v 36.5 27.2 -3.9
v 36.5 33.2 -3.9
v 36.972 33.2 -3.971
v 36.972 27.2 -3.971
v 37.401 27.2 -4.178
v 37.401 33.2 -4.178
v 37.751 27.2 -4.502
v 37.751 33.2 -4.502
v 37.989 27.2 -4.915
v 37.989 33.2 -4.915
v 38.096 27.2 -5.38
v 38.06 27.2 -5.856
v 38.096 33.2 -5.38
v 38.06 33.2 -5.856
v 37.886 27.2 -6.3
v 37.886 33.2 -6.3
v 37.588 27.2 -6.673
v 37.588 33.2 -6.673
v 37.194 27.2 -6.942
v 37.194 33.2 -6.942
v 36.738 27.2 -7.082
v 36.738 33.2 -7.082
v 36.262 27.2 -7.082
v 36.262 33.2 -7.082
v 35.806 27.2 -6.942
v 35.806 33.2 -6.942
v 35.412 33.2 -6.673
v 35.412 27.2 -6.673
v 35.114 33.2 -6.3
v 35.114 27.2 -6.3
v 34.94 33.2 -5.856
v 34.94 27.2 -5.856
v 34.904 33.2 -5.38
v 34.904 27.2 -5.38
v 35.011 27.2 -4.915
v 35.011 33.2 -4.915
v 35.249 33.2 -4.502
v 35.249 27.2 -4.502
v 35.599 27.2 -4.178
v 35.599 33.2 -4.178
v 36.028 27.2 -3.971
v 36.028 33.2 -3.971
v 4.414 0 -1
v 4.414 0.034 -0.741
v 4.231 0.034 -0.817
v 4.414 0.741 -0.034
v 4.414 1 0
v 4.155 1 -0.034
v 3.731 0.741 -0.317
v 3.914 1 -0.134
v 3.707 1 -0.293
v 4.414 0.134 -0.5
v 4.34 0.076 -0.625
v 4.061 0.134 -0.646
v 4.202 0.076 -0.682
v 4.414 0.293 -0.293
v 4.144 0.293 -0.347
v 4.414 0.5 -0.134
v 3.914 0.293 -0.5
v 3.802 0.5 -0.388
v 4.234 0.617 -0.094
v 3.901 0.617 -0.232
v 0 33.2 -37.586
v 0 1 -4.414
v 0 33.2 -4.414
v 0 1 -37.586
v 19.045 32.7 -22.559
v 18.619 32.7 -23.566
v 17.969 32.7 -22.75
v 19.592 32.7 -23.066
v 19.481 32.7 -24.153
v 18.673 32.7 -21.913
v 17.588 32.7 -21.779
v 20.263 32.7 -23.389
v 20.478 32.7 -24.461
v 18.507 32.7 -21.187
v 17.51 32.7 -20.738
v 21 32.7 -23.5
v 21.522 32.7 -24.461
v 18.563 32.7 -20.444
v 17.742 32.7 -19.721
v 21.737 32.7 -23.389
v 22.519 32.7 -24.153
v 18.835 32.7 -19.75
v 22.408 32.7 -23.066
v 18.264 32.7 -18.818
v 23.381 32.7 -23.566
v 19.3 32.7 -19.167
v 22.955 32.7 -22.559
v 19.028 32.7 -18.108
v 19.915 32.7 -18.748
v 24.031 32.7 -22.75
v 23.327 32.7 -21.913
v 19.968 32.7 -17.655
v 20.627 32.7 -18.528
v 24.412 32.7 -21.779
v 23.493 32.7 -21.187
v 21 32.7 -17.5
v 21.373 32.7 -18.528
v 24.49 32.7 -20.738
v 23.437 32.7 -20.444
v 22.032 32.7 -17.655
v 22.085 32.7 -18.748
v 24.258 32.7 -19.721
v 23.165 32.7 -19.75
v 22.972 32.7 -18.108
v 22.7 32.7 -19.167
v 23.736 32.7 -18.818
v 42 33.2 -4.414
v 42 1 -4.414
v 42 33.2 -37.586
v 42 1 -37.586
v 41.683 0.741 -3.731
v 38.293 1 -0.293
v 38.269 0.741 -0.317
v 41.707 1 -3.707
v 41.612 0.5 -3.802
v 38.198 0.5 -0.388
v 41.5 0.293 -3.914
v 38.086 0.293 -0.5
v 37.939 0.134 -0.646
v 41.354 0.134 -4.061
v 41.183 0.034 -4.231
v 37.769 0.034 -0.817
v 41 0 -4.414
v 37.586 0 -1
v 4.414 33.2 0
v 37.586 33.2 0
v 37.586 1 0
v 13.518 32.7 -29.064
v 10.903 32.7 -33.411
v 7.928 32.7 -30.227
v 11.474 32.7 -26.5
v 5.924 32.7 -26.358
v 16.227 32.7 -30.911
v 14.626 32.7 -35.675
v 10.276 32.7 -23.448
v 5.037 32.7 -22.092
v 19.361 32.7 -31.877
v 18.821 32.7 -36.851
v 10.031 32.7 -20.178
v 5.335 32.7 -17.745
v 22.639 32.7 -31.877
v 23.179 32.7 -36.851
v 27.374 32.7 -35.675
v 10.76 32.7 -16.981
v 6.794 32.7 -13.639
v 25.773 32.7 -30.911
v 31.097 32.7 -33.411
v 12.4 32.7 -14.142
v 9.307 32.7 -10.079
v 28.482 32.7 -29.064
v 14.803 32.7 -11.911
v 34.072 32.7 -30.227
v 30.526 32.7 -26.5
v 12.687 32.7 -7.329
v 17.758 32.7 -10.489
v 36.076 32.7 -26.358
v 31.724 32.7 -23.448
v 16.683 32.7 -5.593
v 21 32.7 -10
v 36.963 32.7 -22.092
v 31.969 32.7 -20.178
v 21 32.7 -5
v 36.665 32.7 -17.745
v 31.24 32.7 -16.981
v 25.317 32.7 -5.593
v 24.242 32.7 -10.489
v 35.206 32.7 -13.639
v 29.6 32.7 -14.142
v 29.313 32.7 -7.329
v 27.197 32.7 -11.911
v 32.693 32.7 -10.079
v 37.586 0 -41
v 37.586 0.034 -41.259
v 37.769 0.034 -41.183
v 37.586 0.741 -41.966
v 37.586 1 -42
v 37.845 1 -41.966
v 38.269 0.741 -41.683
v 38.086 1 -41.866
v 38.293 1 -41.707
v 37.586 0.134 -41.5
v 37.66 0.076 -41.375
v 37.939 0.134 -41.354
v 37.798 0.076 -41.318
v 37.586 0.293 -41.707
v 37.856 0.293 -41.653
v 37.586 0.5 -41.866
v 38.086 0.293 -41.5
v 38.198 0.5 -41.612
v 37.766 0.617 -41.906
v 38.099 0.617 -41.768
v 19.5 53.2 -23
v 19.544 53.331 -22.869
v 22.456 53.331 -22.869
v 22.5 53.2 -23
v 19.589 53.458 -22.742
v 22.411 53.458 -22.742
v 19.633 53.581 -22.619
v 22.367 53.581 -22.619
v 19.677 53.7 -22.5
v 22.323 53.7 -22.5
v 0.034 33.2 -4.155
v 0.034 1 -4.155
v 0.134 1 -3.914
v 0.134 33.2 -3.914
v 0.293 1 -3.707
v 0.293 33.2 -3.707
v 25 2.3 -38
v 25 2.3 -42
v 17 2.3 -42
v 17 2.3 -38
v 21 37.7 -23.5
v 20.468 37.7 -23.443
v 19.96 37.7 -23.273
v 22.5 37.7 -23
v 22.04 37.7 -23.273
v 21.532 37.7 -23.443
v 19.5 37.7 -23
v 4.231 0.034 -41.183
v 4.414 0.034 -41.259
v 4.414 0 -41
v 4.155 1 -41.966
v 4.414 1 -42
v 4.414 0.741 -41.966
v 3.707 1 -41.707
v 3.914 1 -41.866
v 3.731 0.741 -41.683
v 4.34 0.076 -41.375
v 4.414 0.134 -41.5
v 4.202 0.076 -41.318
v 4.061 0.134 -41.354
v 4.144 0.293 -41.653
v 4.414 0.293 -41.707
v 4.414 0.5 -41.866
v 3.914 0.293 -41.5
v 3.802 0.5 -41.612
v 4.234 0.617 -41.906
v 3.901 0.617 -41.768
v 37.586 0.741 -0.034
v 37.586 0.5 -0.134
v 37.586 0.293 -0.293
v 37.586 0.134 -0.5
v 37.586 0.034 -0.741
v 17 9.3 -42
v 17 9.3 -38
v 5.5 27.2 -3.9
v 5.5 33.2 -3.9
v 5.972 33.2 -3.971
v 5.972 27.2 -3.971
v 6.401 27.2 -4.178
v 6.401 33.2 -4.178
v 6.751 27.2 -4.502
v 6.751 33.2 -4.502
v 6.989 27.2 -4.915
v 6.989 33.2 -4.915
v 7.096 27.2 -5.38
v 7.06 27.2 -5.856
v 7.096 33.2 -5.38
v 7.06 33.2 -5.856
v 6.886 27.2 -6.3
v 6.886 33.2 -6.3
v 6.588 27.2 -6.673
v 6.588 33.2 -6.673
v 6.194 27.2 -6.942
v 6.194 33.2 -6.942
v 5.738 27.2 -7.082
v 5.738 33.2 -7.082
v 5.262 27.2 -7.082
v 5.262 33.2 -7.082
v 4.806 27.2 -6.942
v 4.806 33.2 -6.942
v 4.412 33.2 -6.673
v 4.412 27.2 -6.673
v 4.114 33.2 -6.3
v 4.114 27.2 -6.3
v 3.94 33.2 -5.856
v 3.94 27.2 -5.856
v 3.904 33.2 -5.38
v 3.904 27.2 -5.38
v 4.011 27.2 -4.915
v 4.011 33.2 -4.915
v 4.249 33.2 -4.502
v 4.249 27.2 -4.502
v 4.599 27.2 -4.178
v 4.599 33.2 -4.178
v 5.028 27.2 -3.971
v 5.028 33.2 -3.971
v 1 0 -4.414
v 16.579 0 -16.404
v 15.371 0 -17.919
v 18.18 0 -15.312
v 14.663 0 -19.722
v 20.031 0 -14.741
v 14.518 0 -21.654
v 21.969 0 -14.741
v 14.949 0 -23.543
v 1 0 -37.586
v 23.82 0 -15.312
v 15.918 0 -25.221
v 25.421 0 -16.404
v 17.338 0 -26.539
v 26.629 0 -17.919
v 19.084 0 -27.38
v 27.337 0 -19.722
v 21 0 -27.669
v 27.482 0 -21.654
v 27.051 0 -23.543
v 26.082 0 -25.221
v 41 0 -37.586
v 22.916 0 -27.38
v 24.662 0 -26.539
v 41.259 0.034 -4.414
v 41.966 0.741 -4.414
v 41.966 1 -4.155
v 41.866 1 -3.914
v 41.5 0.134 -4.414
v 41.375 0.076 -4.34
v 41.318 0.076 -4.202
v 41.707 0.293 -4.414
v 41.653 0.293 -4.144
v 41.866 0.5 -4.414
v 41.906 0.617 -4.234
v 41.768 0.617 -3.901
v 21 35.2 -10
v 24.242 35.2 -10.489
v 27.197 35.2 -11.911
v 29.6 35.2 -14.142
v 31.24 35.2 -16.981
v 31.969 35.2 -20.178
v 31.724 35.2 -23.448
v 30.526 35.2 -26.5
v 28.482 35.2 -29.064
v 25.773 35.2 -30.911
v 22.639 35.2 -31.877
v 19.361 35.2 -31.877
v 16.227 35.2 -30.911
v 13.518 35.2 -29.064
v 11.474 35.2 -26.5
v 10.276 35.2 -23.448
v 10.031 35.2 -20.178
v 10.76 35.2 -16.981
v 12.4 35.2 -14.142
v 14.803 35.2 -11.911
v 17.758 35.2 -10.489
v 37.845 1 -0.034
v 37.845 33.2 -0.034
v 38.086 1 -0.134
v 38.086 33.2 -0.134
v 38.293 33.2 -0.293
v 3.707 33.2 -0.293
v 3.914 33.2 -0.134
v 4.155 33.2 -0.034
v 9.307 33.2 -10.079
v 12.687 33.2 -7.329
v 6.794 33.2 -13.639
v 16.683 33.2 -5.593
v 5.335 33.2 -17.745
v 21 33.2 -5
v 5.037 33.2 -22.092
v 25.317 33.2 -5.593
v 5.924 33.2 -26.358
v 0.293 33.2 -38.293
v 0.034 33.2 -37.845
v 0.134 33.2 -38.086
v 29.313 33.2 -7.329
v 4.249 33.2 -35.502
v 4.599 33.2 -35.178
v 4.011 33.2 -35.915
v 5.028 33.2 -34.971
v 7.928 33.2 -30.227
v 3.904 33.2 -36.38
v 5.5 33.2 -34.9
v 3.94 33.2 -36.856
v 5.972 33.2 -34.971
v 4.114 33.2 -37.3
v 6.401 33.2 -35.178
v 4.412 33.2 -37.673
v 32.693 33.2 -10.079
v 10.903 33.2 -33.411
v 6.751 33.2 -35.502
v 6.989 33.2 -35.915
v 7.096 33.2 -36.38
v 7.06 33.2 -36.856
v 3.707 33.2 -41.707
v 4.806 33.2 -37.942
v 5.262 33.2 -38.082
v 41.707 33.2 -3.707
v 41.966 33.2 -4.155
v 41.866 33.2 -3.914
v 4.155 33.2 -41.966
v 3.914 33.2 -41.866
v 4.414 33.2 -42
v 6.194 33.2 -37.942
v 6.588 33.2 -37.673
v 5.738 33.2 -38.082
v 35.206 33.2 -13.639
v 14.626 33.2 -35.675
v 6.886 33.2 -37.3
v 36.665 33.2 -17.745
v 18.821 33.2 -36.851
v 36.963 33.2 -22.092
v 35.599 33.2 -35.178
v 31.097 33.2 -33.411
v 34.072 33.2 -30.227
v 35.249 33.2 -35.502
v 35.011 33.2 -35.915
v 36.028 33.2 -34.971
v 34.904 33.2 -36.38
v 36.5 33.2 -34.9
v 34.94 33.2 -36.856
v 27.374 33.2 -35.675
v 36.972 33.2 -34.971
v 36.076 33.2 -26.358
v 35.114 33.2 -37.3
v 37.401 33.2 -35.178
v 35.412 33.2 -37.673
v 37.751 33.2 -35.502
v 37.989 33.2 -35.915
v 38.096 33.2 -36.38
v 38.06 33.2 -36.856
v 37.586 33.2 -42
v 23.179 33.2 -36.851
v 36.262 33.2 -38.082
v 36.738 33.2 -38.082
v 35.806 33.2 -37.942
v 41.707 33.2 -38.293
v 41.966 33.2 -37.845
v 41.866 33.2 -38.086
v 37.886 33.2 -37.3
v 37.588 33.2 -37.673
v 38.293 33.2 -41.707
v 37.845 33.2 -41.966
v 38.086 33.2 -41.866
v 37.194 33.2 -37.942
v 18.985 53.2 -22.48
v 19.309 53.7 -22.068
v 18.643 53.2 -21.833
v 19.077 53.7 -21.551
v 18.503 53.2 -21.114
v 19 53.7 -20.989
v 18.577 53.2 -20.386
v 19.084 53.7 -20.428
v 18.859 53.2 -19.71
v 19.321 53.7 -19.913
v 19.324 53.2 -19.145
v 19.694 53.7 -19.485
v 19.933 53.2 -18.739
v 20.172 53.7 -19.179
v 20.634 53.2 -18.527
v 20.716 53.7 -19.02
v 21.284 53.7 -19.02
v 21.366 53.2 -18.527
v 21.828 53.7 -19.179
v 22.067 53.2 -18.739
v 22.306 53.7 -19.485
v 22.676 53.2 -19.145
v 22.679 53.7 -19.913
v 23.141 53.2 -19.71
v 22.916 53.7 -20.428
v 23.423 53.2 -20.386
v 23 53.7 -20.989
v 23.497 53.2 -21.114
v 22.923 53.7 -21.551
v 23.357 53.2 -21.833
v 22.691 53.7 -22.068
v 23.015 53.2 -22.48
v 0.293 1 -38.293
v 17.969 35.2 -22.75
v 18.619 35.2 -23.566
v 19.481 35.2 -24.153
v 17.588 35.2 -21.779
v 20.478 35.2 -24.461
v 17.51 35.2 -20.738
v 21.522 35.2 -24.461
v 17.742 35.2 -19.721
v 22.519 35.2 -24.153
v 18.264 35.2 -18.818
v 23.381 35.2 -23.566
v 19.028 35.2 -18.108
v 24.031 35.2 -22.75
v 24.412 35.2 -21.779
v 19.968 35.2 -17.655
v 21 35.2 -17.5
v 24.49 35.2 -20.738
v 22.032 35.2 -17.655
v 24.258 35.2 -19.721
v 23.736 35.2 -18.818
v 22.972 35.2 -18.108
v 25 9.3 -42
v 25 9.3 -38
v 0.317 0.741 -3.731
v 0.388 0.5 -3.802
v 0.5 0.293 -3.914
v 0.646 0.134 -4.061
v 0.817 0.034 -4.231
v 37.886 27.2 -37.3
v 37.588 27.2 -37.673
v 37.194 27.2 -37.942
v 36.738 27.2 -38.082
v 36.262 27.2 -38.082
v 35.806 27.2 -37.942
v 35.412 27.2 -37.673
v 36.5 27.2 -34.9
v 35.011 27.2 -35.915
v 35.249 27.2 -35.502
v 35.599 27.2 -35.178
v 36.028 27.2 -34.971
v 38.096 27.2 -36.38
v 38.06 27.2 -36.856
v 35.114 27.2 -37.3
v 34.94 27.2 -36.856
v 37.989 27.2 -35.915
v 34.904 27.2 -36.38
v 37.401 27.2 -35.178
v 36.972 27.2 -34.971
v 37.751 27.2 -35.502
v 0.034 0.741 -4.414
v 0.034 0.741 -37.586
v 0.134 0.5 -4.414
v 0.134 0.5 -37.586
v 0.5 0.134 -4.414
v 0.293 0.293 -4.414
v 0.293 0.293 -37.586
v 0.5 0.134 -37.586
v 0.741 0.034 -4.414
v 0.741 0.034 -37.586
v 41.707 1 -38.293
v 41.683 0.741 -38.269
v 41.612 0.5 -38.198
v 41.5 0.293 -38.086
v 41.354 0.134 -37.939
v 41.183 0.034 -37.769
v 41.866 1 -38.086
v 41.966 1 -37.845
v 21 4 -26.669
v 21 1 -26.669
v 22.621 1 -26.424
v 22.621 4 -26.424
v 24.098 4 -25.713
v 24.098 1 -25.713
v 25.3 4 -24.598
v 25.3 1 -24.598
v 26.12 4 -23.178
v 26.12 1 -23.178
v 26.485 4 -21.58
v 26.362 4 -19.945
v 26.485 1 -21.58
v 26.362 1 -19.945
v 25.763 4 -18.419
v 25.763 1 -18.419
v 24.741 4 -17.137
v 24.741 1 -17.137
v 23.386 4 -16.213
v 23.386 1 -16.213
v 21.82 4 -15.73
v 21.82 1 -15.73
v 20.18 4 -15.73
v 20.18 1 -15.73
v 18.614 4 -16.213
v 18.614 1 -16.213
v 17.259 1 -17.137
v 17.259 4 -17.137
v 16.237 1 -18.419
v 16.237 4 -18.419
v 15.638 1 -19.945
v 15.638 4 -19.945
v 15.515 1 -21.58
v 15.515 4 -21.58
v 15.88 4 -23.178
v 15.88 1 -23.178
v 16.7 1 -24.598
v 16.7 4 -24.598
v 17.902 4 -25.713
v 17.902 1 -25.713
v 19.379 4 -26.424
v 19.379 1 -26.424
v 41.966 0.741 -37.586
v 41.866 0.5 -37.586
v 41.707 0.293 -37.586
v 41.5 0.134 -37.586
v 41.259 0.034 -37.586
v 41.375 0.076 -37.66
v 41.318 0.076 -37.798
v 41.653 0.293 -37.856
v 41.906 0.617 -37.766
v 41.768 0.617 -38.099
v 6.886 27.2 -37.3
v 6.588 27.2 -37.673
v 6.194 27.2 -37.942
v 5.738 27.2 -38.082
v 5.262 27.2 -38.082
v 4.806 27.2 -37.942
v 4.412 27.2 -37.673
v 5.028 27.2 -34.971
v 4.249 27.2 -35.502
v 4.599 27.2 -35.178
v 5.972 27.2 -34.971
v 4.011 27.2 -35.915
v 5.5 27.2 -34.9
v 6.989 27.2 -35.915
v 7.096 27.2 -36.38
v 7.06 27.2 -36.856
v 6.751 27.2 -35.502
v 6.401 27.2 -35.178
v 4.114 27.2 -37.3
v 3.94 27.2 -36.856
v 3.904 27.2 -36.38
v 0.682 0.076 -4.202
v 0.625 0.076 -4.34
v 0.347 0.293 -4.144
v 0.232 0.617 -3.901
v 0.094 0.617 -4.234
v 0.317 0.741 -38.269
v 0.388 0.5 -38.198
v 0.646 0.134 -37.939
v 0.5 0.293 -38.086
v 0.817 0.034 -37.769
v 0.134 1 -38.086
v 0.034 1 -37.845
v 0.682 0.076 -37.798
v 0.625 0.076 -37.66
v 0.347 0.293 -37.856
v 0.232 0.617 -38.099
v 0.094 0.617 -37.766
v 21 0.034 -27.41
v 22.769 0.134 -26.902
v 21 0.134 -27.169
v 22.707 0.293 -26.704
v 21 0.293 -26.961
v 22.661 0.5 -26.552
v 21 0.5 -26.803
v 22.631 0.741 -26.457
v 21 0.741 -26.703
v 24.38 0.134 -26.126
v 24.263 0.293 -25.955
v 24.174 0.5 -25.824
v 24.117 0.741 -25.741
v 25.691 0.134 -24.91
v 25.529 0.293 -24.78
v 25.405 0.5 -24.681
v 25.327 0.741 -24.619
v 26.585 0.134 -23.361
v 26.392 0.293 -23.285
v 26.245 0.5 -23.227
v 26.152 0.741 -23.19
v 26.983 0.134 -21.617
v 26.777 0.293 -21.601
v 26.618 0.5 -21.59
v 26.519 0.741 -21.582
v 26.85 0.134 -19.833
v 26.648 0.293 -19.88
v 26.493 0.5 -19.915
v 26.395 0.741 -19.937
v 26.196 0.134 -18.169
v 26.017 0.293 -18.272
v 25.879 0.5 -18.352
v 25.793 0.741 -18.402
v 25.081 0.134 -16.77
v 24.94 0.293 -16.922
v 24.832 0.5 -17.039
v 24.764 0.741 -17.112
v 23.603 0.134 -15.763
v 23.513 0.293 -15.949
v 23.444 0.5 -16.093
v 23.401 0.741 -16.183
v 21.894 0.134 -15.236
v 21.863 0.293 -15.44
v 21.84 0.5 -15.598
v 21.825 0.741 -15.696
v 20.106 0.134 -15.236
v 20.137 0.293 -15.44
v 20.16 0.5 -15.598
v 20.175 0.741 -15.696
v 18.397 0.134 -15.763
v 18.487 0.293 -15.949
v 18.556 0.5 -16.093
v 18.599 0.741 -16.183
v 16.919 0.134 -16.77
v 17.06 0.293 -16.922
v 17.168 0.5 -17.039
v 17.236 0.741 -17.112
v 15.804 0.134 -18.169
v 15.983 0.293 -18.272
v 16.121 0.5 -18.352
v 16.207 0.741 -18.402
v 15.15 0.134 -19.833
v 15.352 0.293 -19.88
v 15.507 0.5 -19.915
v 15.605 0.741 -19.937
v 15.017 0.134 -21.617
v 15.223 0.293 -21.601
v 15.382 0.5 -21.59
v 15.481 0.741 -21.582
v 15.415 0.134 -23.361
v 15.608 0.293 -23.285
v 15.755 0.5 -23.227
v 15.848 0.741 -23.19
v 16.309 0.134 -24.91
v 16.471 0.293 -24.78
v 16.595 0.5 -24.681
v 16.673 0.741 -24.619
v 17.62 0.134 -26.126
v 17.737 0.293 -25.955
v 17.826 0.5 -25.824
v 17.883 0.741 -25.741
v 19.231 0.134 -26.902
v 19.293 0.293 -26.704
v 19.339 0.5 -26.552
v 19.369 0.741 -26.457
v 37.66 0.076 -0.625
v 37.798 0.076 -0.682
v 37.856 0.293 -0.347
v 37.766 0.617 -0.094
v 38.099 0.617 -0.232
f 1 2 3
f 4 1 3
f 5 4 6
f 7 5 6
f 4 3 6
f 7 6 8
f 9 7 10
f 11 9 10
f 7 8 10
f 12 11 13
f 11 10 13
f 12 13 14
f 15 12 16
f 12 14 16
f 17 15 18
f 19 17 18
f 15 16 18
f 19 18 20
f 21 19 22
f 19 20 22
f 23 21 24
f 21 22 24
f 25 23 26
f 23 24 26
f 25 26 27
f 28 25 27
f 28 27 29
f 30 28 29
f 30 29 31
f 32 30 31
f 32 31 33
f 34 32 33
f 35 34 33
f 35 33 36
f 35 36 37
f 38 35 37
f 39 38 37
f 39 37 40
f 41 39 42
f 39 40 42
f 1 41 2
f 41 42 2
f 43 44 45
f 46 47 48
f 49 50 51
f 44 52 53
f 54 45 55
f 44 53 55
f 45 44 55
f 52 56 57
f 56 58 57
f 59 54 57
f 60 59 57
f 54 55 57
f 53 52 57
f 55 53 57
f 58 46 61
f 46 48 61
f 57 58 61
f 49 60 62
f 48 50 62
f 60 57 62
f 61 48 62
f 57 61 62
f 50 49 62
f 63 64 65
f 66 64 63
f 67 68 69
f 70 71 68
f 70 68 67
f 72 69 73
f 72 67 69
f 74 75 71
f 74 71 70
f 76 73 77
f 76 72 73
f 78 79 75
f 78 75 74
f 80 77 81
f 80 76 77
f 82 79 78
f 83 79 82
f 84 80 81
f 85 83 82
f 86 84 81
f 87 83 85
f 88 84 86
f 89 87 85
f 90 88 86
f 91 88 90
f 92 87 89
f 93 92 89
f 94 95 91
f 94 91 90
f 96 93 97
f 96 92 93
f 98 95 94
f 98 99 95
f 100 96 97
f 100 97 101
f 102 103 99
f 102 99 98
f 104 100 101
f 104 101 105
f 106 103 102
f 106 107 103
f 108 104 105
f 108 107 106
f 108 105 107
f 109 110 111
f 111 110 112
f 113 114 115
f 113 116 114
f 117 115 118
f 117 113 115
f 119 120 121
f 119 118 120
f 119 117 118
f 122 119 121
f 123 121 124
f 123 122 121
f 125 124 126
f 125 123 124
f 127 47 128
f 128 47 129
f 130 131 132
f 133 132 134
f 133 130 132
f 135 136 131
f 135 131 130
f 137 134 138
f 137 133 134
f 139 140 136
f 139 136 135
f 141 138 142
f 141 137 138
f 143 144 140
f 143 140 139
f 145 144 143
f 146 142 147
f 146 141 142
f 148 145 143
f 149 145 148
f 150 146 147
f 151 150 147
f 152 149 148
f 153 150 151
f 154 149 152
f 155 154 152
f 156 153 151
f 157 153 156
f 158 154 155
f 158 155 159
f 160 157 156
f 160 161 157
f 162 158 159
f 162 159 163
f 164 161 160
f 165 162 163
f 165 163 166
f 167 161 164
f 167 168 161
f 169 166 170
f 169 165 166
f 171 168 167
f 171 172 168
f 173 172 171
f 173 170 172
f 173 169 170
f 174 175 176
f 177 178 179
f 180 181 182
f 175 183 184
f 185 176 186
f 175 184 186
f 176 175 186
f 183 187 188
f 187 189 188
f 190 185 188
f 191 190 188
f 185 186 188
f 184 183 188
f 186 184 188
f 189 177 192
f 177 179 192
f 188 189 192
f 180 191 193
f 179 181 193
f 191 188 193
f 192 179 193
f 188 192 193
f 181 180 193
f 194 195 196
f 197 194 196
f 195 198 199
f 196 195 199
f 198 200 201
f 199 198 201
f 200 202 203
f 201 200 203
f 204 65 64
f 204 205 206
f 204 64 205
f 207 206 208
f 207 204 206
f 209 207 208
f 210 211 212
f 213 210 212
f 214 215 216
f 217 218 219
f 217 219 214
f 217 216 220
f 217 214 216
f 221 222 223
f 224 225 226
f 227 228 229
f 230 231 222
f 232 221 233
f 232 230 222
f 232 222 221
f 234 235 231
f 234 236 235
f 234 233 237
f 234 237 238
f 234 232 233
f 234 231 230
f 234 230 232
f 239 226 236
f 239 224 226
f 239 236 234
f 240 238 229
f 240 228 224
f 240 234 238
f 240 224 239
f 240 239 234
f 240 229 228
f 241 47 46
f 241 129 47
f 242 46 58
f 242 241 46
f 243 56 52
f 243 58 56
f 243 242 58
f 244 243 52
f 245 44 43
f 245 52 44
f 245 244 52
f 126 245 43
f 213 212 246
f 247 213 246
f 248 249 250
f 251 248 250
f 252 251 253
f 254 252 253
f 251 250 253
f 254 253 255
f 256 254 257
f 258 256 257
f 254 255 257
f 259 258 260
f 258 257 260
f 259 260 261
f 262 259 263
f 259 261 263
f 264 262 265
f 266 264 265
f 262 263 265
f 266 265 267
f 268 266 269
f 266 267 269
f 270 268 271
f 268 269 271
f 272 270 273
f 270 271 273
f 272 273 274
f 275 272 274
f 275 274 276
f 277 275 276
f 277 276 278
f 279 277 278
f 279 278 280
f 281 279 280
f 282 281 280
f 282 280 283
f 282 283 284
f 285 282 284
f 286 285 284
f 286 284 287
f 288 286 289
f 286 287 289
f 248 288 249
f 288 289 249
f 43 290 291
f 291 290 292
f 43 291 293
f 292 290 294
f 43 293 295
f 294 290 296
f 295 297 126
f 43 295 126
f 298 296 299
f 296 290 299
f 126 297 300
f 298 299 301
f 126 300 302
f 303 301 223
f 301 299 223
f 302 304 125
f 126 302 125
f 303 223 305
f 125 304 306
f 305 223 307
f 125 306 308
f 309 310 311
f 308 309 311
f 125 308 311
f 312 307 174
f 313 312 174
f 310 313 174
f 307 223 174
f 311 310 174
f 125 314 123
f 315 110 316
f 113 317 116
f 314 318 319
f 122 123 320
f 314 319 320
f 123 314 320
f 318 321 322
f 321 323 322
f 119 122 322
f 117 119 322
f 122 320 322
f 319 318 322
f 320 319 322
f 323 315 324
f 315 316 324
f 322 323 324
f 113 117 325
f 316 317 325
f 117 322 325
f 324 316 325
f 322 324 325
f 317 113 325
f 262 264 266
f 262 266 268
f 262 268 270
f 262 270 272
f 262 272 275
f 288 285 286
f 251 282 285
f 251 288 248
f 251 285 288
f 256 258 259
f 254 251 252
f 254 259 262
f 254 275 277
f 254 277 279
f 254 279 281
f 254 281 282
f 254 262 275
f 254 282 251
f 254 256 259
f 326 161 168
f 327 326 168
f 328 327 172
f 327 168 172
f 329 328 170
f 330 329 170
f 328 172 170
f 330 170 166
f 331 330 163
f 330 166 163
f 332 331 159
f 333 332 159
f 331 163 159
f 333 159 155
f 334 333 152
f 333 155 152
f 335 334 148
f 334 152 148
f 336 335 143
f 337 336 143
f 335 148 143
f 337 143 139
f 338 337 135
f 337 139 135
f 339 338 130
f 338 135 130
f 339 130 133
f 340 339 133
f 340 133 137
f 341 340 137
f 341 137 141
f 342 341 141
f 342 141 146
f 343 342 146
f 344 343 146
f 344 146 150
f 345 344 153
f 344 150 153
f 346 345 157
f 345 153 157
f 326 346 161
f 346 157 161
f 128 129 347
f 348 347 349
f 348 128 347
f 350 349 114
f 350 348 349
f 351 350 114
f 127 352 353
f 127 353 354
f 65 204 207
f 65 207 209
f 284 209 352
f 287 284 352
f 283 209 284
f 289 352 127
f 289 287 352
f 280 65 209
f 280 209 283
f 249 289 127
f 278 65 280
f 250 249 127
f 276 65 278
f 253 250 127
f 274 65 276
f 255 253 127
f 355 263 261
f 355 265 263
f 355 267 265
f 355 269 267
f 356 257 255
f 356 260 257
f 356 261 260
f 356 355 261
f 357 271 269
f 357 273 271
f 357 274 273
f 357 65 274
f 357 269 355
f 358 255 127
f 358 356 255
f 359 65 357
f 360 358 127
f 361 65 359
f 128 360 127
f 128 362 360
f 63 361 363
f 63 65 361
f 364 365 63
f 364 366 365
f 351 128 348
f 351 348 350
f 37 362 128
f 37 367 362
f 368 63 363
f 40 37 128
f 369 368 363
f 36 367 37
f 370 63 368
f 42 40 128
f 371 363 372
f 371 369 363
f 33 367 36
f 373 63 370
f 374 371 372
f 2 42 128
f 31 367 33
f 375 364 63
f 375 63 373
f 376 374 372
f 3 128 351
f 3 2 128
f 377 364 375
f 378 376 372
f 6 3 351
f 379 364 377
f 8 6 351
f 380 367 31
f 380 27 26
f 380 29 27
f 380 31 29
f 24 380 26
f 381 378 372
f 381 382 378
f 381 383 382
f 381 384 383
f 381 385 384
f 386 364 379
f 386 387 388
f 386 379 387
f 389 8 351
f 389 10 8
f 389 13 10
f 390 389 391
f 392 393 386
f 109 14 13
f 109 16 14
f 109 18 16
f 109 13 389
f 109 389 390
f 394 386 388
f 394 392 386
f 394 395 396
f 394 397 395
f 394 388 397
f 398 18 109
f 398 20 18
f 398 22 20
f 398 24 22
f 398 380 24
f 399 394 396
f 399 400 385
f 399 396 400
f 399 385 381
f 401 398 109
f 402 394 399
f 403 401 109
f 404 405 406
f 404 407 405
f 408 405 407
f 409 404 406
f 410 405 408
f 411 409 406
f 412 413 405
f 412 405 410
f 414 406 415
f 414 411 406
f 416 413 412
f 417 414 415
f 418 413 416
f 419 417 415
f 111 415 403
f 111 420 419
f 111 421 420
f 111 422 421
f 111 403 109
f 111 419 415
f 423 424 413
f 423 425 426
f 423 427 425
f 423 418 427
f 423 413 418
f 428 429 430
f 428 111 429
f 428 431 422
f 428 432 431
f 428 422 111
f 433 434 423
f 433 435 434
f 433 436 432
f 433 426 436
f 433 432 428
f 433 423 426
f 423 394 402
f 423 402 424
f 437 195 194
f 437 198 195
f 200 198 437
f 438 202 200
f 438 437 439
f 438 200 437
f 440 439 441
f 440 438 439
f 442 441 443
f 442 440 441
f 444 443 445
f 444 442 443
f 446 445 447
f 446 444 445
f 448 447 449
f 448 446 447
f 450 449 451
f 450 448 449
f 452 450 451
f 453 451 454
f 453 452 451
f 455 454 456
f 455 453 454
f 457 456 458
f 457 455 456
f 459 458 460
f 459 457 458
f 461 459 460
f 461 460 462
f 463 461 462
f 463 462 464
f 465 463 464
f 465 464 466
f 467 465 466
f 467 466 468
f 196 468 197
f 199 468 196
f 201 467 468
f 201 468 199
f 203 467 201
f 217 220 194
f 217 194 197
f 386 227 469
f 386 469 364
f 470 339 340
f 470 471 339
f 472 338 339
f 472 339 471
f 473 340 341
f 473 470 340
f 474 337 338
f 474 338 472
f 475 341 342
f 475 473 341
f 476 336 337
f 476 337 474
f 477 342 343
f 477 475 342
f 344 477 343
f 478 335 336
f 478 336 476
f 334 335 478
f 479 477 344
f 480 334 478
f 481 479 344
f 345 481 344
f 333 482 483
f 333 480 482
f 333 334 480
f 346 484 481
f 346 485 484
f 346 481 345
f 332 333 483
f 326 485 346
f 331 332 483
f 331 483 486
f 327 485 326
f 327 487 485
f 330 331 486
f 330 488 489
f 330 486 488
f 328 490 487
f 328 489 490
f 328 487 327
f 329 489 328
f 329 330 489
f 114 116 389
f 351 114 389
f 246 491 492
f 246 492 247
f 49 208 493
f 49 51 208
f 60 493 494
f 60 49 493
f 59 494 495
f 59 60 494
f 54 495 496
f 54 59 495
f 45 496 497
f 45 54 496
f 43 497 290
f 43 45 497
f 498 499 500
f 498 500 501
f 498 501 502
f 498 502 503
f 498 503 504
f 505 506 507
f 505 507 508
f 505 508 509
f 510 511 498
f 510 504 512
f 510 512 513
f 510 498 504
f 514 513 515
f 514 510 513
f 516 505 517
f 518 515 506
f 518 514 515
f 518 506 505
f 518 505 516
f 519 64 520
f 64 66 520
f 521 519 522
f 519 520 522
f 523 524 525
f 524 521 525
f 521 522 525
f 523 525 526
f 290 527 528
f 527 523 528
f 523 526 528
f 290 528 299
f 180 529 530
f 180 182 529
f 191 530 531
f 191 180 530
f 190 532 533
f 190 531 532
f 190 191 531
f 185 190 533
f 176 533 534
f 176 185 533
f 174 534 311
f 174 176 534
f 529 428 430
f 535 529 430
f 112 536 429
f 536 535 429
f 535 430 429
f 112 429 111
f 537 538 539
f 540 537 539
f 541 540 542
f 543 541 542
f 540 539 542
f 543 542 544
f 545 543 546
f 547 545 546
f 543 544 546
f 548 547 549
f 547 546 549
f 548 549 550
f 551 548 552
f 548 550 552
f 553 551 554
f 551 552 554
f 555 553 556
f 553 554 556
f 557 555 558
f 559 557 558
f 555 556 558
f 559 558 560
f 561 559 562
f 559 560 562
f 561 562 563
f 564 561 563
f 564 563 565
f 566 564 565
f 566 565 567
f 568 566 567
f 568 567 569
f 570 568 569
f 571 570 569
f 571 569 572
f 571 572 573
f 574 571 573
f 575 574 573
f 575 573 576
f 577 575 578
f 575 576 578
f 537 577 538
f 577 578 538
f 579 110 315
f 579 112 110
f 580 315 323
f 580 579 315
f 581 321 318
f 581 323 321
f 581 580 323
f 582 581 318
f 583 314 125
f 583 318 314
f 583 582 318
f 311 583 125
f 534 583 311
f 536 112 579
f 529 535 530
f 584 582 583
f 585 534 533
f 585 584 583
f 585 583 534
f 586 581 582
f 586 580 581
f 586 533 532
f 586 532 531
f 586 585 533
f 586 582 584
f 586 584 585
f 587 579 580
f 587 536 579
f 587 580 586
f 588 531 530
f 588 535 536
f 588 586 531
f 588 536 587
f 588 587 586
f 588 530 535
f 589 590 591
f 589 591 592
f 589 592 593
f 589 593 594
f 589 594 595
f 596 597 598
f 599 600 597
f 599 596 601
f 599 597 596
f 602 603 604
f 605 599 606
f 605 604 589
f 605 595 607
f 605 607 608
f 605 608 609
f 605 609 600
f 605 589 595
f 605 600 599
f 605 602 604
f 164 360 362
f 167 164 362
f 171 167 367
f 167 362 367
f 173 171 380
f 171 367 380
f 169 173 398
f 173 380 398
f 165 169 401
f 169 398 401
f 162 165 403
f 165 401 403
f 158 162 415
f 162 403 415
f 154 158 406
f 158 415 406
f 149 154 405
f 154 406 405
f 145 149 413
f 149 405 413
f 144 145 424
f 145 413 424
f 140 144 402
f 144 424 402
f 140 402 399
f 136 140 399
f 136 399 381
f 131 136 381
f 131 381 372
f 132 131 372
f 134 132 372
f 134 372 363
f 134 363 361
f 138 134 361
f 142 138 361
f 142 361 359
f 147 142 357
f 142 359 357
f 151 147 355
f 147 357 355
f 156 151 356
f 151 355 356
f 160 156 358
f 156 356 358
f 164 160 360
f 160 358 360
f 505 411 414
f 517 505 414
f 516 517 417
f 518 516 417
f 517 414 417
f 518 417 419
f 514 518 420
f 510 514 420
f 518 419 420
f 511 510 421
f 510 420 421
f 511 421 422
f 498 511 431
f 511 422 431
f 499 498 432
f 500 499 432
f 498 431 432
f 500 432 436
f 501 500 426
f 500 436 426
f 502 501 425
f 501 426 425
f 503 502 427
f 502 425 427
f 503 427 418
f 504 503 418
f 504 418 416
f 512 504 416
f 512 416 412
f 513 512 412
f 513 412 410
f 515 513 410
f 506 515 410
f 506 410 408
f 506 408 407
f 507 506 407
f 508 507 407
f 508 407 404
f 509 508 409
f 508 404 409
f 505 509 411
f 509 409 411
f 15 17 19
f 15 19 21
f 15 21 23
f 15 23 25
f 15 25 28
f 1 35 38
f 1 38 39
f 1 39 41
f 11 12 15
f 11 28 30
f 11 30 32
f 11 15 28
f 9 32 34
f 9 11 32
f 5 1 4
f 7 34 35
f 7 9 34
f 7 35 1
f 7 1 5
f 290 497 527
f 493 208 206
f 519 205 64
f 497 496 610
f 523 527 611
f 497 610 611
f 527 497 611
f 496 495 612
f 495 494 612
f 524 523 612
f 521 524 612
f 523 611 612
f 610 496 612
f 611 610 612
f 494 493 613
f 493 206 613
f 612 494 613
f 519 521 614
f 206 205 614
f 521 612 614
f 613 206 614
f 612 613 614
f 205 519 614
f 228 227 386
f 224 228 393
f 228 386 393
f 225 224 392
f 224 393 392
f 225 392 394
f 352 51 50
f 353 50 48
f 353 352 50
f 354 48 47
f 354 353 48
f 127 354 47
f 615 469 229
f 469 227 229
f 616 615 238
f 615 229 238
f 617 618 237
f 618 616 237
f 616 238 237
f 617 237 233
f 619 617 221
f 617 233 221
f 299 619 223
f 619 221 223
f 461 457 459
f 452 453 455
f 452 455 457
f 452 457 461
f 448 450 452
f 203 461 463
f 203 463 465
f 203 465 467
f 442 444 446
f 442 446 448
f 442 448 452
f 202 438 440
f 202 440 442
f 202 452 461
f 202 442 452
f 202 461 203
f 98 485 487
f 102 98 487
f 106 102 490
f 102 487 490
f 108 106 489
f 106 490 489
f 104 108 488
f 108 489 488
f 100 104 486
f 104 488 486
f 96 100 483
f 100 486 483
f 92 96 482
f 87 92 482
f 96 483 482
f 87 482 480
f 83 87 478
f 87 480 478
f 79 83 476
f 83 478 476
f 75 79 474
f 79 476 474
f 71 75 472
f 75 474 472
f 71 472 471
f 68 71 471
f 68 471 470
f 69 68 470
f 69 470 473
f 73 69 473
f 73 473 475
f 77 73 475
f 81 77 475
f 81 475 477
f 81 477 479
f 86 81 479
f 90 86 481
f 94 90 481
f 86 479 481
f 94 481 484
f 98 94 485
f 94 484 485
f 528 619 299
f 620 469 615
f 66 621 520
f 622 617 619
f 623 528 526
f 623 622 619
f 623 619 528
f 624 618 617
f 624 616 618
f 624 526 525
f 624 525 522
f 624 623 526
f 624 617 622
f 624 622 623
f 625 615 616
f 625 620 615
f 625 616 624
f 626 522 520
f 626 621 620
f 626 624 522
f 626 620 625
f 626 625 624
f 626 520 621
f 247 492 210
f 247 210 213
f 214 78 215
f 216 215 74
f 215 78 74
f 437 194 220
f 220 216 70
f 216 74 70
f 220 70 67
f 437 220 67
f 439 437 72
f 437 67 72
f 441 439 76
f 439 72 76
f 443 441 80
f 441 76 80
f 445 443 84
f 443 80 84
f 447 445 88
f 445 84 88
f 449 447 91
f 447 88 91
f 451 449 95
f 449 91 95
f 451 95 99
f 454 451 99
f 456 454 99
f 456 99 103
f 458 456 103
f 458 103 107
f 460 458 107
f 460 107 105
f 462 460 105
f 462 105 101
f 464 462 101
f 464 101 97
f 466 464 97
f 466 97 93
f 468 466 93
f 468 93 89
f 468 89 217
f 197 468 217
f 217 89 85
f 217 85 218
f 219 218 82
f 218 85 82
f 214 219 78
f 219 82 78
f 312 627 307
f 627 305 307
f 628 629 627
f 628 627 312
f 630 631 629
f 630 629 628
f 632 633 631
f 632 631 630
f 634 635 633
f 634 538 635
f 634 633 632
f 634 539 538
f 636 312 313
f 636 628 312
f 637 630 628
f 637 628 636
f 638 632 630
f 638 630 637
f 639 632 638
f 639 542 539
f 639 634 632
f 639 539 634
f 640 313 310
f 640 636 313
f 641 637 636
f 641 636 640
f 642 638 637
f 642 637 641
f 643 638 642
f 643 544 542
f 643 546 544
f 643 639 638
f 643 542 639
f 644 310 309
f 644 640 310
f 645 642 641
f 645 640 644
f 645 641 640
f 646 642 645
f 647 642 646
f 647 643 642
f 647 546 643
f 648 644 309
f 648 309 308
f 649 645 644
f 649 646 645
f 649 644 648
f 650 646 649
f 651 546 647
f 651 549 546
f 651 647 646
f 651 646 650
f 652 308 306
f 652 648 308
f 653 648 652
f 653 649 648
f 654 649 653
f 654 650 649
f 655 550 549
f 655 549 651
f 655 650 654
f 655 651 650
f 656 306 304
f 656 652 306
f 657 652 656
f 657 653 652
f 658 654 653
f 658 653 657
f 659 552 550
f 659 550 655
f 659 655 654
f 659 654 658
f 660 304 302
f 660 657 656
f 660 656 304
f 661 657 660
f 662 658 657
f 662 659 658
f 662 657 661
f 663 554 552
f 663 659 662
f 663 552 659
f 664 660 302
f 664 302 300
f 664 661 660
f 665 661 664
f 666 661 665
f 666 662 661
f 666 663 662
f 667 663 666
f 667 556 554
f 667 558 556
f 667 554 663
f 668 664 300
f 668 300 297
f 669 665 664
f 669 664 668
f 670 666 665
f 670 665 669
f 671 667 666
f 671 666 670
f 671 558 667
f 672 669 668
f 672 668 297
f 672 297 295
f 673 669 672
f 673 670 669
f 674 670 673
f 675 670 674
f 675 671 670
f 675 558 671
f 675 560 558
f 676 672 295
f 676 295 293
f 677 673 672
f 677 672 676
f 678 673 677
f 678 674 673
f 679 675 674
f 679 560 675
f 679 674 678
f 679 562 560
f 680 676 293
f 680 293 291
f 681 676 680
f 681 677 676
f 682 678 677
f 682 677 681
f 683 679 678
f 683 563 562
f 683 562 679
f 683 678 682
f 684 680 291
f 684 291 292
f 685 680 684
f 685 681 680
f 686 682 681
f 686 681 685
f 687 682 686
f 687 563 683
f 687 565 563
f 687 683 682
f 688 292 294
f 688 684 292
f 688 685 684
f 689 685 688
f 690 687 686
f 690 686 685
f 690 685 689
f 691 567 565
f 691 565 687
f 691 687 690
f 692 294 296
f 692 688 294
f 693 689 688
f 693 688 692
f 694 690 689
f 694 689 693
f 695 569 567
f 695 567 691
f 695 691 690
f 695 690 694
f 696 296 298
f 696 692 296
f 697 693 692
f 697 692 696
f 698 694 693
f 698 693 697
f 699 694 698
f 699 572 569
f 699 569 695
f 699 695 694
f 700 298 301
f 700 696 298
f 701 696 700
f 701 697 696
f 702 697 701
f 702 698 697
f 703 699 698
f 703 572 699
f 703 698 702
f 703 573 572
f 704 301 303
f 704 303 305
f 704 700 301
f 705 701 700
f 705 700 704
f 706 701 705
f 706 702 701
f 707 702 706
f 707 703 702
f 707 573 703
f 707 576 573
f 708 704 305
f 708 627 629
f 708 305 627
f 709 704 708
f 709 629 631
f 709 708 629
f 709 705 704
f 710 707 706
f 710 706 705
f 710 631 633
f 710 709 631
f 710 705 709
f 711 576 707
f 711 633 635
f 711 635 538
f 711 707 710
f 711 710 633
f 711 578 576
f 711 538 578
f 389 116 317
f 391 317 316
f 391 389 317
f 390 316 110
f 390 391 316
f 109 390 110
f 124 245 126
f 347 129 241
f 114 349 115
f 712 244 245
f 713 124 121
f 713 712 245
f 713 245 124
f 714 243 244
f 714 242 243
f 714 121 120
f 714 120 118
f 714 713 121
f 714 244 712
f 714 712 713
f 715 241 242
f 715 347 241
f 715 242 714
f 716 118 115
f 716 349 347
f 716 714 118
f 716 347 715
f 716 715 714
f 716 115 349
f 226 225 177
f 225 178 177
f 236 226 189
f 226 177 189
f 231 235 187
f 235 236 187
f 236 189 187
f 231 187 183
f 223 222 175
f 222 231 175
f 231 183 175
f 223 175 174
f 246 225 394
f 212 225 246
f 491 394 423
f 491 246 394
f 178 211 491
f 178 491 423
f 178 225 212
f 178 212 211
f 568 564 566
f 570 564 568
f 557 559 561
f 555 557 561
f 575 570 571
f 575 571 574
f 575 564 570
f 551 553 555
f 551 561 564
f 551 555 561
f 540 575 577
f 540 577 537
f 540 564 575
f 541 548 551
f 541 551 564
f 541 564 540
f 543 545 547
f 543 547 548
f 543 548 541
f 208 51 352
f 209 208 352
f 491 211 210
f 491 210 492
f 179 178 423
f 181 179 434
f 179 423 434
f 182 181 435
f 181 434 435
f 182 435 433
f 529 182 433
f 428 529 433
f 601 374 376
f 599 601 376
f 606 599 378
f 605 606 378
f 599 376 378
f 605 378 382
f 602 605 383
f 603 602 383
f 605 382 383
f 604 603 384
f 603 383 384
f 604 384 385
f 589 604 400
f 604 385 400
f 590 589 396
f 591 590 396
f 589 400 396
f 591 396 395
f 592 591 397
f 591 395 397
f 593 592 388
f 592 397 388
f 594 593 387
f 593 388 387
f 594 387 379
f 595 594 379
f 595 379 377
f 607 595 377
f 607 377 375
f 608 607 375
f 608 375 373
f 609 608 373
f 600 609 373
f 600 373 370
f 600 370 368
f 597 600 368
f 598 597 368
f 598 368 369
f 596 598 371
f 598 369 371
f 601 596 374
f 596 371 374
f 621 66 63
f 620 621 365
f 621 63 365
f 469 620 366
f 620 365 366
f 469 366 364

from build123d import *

# Parameters (mm, degrees)
SKETCH1_W           = 42
SKETCH1_H           = 42
BOSS_EXTRUDE1_DEPTH = 33.2
CHAMFER1_SIZE       = 4
SKETCH2_R           = 16
CUT_EXTRUDE1_DEPTH  = 0.5
SKETCH3_R           = 11
BOSS_EXTRUDE3_DEPTH = 2.5
SKETCH4_R           = 3.5
CUT_EXTRUDE2_DEPTH  = 2.5
SKETCH7_R           = 5.5
CUT_EXTRUDE4_DEPTH  = 4
SKETCH5_R           = 2.5
BOSS_EXTRUDE4_DEPTH = 21
CUT_EXTRUDE3_START  = -16
CUT_EXTRUDE3_DEPTH  = 16
CHAMFER2_SIZE       = 0.5
SKETCH8_R           = 1.6
CUT_EXTRUDE5_DEPTH  = 6
SKETCH9_W           = 8
SKETCH9_H           = 7
CUT_EXTRUDE6_DEPTH  = 4
FILLET1_R           = 1


with BuildPart() as part:
    # Sketch1 → Boss-Extrude1 (new body)
    with BuildSketch(Plane(origin=(0, 0, 0), x_dir=(1, 0, 0), z_dir=(0, 1, 0))):
        with Locations((21, 21)):
            Rectangle(SKETCH1_W, SKETCH1_H)
    extrude(amount=BOSS_EXTRUDE1_DEPTH)

    # Chamfer1
    chamfer1_edges = [part.edges().sort_by_distance(p)[0] for p in [
        (0, 16.6, -42),
        (42, 16.6, -42),
        (42, 16.6, 0),
        (0, 16.6, 0),
    ]]
    chamfer(chamfer1_edges, length=CHAMFER1_SIZE)

    # Sketch2 → Cut-Extrude1 (cut)
    with BuildSketch(Plane(origin=(0, 33.2, 0), x_dir=(1, 0, 0), z_dir=(0, 1, 0))):
        with Locations(Location((21, 21, 0), (0, 0, 270))):
            Circle(SKETCH2_R)
    extrude(amount=-CUT_EXTRUDE1_DEPTH, mode=Mode.SUBTRACT)

    # Sketch3 → Boss-Extrude3 (add)
    with BuildSketch(Plane(origin=(0, 32.7, 0), x_dir=(1, 0, 0), z_dir=(0, 1, 0))):
        with Locations(Location((21, 21, 0), (0, 0, 270))):
            Circle(SKETCH3_R)
    extrude(amount=BOSS_EXTRUDE3_DEPTH)

    # Sketch4 → Cut-Extrude2 (cut)
    with BuildSketch(Plane(origin=(0, 35.2, 0), x_dir=(1, 0, 0), z_dir=(0, 1, 0))):
        with Locations(Location((21, 21, 0), (0, 0, 270))):
            Circle(SKETCH4_R)
    extrude(amount=-CUT_EXTRUDE2_DEPTH, mode=Mode.SUBTRACT)

    # Sketch7 → Cut-Extrude4 (cut)
    with BuildSketch(Plane.XZ):
        with Locations(Location((21, -21.16858083, 0), (0, 0, 270))):
            Circle(SKETCH7_R)
    extrude(amount=-CUT_EXTRUDE4_DEPTH, mode=Mode.SUBTRACT)

    # Sketch5 → Boss-Extrude4 (add)
    with BuildSketch(Plane(origin=(0, 32.7, 0), x_dir=(1, 0, 0), z_dir=(0, 1, 0))):
        with Locations(Location((21, 21, 0), (0, 0, 90))):
            Circle(SKETCH5_R)
    extrude(amount=BOSS_EXTRUDE4_DEPTH)

    # Sketch6 → Cut-Extrude3 (cut)
    with BuildSketch(Plane(origin=(0, 53.7, 0), x_dir=(1, 0, 0), z_dir=(0, 1, 0)).offset(CUT_EXTRUDE3_START)):
        with BuildLine():
            Line((19.5, 23), (22.5, 23))
            ThreePointArc((22.5, 23), (21, 23.5), (19.5, 23))
        make_face()
    extrude(amount=CUT_EXTRUDE3_DEPTH, mode=Mode.SUBTRACT)

    # Chamfer2
    chamfer2_edges = [part.edges().sort_by_distance(p)[0] for p in [
        (21, 53.7, -18.5),
        (21, 53.7, -23),
    ]]
    chamfer(chamfer2_edges, length=CHAMFER2_SIZE - 0.0001)  # a hair under: the kernel refuses the full size

    # Sketch8 → Cut-Extrude5 (cut)
    with BuildSketch(Plane(origin=(0, 33.2, 0), x_dir=(1, 0, 0), z_dir=(0, 1, 0))):
        with Locations(Location((5.5, 36.5, 0), (0, 0, 270))):
            Circle(SKETCH8_R)
        with Locations(Location((36.5, 36.5, 0), (0, 0, 270))):
            Circle(SKETCH8_R)
        with Locations(Location((36.5, 5.5, 0), (0, 0, 270))):
            Circle(SKETCH8_R)
        with Locations(Location((5.5, 5.5, 0), (0, 0, 270))):
            Circle(SKETCH8_R)
    extrude(amount=-CUT_EXTRUDE5_DEPTH, mode=Mode.SUBTRACT)

    # Sketch9 → Cut-Extrude6 (cut)
    with BuildSketch(Plane(origin=(0, 0, -42), x_dir=(-1, 0, 0), z_dir=(0, 0, -1))):
        with Locations((-21, 5.8)):
            Rectangle(SKETCH9_W, SKETCH9_H)
    extrude(amount=-CUT_EXTRUDE6_DEPTH, mode=Mode.SUBTRACT)

    # Fillet1
    fillet1_edges = [part.edges().sort_by_distance(p)[0] for p in [
        (0, 0, -21),
        (0, 16.6, -4),
        (0, 16.6, -38),
        (21, 0, -42),
        (42, 0, -21),
        (21, 0, 0),
        (40, 0, -2),
        (2, 0, -2),
        (40, 0, -40),
        (2, 0, -40),
        (38, 16.6, -42),
        (4, 16.6, -42),
        (42, 16.6, -4),
        (42, 16.6, -38),
        (38, 16.6, 0),
        (4, 16.6, 0),
        (21, 0, -15.66858083),
    ]]
    fillet(fillet1_edges, radius=FILLET1_R)


solid = part.part
